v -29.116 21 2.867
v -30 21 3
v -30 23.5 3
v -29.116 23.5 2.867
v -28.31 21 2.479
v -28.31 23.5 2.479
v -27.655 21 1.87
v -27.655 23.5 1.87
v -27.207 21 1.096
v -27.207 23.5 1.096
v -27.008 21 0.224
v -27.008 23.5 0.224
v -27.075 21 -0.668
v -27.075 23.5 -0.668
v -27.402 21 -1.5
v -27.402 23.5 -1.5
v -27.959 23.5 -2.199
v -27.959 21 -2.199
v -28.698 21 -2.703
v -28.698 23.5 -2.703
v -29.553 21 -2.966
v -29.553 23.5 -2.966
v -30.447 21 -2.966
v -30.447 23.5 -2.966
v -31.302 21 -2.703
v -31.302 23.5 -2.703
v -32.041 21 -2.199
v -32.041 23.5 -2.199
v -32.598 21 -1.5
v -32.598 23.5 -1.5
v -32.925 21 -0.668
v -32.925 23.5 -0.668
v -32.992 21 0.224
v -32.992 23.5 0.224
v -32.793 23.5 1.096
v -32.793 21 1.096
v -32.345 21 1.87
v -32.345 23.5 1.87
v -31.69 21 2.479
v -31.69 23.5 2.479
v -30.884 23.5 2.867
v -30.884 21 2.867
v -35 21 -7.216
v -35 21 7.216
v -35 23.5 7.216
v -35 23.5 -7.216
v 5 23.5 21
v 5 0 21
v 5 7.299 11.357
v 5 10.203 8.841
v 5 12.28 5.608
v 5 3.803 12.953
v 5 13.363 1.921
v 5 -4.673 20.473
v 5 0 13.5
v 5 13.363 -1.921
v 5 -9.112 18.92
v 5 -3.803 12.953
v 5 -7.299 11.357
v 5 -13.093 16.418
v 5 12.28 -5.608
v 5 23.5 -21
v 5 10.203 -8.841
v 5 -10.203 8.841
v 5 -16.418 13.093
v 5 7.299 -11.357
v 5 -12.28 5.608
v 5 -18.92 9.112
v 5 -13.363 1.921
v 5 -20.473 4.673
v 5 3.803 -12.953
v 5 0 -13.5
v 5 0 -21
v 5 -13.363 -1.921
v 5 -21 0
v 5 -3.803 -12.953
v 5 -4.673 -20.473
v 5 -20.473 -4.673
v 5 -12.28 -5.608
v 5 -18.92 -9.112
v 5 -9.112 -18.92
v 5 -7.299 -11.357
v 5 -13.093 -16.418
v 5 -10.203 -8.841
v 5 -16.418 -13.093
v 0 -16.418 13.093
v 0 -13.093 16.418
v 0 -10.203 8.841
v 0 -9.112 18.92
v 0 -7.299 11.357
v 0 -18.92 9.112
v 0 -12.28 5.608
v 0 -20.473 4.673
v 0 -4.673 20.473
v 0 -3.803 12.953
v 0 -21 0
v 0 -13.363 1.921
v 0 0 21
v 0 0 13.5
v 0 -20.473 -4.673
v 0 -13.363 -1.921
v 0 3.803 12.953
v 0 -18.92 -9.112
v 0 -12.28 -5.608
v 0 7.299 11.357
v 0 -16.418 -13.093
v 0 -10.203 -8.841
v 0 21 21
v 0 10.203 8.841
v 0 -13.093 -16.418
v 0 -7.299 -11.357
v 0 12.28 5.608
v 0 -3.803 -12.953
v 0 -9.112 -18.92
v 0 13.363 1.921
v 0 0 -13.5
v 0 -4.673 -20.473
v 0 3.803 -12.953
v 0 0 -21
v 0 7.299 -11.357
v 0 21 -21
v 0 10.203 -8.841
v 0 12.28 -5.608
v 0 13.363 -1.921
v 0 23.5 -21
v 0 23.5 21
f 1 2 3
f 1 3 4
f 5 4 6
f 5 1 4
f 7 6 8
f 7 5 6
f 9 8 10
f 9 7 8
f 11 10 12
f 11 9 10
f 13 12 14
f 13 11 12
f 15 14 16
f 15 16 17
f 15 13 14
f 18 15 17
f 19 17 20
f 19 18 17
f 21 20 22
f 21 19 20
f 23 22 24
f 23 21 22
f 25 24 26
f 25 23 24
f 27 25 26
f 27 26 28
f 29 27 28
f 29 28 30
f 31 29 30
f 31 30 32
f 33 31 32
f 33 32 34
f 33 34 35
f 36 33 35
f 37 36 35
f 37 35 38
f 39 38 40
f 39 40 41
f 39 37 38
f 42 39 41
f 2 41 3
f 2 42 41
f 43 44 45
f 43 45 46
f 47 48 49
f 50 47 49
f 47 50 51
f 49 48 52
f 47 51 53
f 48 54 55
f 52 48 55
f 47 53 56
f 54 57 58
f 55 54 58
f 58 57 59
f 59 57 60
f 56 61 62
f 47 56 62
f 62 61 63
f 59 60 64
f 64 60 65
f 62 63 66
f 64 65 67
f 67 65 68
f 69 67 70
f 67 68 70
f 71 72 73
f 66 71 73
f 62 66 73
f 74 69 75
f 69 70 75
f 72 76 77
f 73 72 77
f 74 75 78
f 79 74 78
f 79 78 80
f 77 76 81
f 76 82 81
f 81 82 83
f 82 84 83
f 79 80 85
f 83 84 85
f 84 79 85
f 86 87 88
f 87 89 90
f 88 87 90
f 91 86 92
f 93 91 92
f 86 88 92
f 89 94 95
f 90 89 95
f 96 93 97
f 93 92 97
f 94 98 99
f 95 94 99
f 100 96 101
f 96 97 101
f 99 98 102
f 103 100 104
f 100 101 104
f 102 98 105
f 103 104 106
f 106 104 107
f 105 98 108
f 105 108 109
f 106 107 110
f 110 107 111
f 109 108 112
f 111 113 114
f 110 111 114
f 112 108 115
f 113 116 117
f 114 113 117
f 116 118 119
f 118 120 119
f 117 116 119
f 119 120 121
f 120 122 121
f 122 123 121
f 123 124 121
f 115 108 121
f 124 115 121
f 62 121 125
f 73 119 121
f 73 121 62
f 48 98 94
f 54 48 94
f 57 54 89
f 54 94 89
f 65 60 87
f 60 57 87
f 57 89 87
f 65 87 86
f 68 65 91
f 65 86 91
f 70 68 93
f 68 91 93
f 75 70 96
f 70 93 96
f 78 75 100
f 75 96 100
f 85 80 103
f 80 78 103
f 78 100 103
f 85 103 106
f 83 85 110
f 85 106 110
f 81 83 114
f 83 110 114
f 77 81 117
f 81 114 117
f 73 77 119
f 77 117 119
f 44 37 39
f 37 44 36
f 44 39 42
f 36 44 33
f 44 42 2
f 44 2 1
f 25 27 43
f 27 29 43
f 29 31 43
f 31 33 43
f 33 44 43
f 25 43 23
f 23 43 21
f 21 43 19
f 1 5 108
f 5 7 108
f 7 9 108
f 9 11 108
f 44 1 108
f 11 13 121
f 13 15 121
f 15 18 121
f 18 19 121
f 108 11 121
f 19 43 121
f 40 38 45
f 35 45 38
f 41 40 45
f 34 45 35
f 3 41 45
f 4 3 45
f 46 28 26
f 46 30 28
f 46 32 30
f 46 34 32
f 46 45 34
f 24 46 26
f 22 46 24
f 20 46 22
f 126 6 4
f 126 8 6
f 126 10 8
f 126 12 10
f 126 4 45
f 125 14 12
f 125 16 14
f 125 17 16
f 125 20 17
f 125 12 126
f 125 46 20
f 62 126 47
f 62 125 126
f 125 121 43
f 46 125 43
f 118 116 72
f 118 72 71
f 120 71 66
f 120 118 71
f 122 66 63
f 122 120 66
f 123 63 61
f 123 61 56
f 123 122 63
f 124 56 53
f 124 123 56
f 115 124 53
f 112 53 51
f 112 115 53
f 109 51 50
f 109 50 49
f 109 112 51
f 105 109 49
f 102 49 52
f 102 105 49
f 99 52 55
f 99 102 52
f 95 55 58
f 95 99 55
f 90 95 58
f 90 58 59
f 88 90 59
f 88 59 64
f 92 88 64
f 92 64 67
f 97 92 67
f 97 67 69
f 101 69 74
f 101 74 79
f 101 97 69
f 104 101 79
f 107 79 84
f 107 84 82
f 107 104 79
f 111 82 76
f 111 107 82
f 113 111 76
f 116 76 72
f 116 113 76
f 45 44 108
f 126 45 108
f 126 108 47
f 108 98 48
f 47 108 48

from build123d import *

# Parameters (mm, degrees)
SKETCH1_R                = 21
SKETCH1_R_2              = 13.5
BOSS_EXTRUDE1_DEPTH      = 5
BOSS_EXTRUDE2_REACH      = 49.223
BOSS_EXTRUDE2_END_RADIUS = 21
SKETCH2_W                = 5
SKETCH2_H                = 42
SKETCH2_3_W              = 40
SKETCH2_3_H              = 42
SKETCH2_3_R              = 3
BOSS_EXTRUDE3_DEPTH      = 2.5
CUT_EXTRUDE4_DEPTH       = 59.566201857


with BuildPart() as part:
    # Sketch1 → Boss-Extrude1 (new body)
    with BuildSketch(Plane(origin=(0, 0, 0), x_dir=(0, 0, -1), z_dir=(1, 0, 0))):
        Circle(SKETCH1_R)
        Circle(SKETCH1_R_2, mode=Mode.SUBTRACT)
    extrude(amount=BOSS_EXTRUDE1_DEPTH)

    # Boss-Extrude2: up to this cylinder (the profile starts outside it)
    boss_extrude2_end = Plane(origin=(2.5, 0, 0), z_dir=(-1, 0, 0)) * Cylinder(BOSS_EXTRUDE2_END_RADIUS, 141.446, mode=Mode.PRIVATE)
    # Sketch2 → Boss-Extrude2 (add, up to the surface)
    with BuildSketch(Plane(origin=(0, 21, 0), x_dir=(1, 0, 0), z_dir=(0, 1, 0)), mode=Mode.PRIVATE) as boss_extrude2_sk1:
        with Locations((2.5, 0)):
            Rectangle(SKETCH2_W, SKETCH2_H)
    boss_extrude2_tool1 = extrude(boss_extrude2_sk1.sketch, amount=-BOSS_EXTRUDE2_REACH, mode=Mode.PRIVATE) - boss_extrude2_end
    add(boss_extrude2_tool1.solids().sort_by_distance((2.5, 21, 0))[0])
    add(boss_extrude2_tool1.solids().sort_by_distance((2.5, 21, 0))[1])

    # Sketch2<3> → Boss-Extrude3 (add)
    with BuildSketch(Plane(origin=(0, 21, 0), x_dir=(1, 0, 0), z_dir=(0, 1, 0))):
        with Locations((-15, 0)):
            Rectangle(SKETCH2_3_W, SKETCH2_3_H)
        with Locations((-30, 0)):
            Circle(SKETCH2_3_R, mode=Mode.SUBTRACT)
    extrude(amount=BOSS_EXTRUDE3_DEPTH)

    # Sketch3 → Cut-Extrude4 (cut, through all)
    with BuildSketch(Plane.XZ.offset(-21)):
        Polygon((0, -21), (-35, -7.216009452), (-35, 7.216009452), (0, 21), (0, 27.25128432), (-40.763754419, 27.25128432), (-40.763754419, -28.471778575), (0, -28.471778575), align=None)
    extrude(amount=-CUT_EXTRUDE4_DEPTH, mode=Mode.SUBTRACT)


solid = part.part
